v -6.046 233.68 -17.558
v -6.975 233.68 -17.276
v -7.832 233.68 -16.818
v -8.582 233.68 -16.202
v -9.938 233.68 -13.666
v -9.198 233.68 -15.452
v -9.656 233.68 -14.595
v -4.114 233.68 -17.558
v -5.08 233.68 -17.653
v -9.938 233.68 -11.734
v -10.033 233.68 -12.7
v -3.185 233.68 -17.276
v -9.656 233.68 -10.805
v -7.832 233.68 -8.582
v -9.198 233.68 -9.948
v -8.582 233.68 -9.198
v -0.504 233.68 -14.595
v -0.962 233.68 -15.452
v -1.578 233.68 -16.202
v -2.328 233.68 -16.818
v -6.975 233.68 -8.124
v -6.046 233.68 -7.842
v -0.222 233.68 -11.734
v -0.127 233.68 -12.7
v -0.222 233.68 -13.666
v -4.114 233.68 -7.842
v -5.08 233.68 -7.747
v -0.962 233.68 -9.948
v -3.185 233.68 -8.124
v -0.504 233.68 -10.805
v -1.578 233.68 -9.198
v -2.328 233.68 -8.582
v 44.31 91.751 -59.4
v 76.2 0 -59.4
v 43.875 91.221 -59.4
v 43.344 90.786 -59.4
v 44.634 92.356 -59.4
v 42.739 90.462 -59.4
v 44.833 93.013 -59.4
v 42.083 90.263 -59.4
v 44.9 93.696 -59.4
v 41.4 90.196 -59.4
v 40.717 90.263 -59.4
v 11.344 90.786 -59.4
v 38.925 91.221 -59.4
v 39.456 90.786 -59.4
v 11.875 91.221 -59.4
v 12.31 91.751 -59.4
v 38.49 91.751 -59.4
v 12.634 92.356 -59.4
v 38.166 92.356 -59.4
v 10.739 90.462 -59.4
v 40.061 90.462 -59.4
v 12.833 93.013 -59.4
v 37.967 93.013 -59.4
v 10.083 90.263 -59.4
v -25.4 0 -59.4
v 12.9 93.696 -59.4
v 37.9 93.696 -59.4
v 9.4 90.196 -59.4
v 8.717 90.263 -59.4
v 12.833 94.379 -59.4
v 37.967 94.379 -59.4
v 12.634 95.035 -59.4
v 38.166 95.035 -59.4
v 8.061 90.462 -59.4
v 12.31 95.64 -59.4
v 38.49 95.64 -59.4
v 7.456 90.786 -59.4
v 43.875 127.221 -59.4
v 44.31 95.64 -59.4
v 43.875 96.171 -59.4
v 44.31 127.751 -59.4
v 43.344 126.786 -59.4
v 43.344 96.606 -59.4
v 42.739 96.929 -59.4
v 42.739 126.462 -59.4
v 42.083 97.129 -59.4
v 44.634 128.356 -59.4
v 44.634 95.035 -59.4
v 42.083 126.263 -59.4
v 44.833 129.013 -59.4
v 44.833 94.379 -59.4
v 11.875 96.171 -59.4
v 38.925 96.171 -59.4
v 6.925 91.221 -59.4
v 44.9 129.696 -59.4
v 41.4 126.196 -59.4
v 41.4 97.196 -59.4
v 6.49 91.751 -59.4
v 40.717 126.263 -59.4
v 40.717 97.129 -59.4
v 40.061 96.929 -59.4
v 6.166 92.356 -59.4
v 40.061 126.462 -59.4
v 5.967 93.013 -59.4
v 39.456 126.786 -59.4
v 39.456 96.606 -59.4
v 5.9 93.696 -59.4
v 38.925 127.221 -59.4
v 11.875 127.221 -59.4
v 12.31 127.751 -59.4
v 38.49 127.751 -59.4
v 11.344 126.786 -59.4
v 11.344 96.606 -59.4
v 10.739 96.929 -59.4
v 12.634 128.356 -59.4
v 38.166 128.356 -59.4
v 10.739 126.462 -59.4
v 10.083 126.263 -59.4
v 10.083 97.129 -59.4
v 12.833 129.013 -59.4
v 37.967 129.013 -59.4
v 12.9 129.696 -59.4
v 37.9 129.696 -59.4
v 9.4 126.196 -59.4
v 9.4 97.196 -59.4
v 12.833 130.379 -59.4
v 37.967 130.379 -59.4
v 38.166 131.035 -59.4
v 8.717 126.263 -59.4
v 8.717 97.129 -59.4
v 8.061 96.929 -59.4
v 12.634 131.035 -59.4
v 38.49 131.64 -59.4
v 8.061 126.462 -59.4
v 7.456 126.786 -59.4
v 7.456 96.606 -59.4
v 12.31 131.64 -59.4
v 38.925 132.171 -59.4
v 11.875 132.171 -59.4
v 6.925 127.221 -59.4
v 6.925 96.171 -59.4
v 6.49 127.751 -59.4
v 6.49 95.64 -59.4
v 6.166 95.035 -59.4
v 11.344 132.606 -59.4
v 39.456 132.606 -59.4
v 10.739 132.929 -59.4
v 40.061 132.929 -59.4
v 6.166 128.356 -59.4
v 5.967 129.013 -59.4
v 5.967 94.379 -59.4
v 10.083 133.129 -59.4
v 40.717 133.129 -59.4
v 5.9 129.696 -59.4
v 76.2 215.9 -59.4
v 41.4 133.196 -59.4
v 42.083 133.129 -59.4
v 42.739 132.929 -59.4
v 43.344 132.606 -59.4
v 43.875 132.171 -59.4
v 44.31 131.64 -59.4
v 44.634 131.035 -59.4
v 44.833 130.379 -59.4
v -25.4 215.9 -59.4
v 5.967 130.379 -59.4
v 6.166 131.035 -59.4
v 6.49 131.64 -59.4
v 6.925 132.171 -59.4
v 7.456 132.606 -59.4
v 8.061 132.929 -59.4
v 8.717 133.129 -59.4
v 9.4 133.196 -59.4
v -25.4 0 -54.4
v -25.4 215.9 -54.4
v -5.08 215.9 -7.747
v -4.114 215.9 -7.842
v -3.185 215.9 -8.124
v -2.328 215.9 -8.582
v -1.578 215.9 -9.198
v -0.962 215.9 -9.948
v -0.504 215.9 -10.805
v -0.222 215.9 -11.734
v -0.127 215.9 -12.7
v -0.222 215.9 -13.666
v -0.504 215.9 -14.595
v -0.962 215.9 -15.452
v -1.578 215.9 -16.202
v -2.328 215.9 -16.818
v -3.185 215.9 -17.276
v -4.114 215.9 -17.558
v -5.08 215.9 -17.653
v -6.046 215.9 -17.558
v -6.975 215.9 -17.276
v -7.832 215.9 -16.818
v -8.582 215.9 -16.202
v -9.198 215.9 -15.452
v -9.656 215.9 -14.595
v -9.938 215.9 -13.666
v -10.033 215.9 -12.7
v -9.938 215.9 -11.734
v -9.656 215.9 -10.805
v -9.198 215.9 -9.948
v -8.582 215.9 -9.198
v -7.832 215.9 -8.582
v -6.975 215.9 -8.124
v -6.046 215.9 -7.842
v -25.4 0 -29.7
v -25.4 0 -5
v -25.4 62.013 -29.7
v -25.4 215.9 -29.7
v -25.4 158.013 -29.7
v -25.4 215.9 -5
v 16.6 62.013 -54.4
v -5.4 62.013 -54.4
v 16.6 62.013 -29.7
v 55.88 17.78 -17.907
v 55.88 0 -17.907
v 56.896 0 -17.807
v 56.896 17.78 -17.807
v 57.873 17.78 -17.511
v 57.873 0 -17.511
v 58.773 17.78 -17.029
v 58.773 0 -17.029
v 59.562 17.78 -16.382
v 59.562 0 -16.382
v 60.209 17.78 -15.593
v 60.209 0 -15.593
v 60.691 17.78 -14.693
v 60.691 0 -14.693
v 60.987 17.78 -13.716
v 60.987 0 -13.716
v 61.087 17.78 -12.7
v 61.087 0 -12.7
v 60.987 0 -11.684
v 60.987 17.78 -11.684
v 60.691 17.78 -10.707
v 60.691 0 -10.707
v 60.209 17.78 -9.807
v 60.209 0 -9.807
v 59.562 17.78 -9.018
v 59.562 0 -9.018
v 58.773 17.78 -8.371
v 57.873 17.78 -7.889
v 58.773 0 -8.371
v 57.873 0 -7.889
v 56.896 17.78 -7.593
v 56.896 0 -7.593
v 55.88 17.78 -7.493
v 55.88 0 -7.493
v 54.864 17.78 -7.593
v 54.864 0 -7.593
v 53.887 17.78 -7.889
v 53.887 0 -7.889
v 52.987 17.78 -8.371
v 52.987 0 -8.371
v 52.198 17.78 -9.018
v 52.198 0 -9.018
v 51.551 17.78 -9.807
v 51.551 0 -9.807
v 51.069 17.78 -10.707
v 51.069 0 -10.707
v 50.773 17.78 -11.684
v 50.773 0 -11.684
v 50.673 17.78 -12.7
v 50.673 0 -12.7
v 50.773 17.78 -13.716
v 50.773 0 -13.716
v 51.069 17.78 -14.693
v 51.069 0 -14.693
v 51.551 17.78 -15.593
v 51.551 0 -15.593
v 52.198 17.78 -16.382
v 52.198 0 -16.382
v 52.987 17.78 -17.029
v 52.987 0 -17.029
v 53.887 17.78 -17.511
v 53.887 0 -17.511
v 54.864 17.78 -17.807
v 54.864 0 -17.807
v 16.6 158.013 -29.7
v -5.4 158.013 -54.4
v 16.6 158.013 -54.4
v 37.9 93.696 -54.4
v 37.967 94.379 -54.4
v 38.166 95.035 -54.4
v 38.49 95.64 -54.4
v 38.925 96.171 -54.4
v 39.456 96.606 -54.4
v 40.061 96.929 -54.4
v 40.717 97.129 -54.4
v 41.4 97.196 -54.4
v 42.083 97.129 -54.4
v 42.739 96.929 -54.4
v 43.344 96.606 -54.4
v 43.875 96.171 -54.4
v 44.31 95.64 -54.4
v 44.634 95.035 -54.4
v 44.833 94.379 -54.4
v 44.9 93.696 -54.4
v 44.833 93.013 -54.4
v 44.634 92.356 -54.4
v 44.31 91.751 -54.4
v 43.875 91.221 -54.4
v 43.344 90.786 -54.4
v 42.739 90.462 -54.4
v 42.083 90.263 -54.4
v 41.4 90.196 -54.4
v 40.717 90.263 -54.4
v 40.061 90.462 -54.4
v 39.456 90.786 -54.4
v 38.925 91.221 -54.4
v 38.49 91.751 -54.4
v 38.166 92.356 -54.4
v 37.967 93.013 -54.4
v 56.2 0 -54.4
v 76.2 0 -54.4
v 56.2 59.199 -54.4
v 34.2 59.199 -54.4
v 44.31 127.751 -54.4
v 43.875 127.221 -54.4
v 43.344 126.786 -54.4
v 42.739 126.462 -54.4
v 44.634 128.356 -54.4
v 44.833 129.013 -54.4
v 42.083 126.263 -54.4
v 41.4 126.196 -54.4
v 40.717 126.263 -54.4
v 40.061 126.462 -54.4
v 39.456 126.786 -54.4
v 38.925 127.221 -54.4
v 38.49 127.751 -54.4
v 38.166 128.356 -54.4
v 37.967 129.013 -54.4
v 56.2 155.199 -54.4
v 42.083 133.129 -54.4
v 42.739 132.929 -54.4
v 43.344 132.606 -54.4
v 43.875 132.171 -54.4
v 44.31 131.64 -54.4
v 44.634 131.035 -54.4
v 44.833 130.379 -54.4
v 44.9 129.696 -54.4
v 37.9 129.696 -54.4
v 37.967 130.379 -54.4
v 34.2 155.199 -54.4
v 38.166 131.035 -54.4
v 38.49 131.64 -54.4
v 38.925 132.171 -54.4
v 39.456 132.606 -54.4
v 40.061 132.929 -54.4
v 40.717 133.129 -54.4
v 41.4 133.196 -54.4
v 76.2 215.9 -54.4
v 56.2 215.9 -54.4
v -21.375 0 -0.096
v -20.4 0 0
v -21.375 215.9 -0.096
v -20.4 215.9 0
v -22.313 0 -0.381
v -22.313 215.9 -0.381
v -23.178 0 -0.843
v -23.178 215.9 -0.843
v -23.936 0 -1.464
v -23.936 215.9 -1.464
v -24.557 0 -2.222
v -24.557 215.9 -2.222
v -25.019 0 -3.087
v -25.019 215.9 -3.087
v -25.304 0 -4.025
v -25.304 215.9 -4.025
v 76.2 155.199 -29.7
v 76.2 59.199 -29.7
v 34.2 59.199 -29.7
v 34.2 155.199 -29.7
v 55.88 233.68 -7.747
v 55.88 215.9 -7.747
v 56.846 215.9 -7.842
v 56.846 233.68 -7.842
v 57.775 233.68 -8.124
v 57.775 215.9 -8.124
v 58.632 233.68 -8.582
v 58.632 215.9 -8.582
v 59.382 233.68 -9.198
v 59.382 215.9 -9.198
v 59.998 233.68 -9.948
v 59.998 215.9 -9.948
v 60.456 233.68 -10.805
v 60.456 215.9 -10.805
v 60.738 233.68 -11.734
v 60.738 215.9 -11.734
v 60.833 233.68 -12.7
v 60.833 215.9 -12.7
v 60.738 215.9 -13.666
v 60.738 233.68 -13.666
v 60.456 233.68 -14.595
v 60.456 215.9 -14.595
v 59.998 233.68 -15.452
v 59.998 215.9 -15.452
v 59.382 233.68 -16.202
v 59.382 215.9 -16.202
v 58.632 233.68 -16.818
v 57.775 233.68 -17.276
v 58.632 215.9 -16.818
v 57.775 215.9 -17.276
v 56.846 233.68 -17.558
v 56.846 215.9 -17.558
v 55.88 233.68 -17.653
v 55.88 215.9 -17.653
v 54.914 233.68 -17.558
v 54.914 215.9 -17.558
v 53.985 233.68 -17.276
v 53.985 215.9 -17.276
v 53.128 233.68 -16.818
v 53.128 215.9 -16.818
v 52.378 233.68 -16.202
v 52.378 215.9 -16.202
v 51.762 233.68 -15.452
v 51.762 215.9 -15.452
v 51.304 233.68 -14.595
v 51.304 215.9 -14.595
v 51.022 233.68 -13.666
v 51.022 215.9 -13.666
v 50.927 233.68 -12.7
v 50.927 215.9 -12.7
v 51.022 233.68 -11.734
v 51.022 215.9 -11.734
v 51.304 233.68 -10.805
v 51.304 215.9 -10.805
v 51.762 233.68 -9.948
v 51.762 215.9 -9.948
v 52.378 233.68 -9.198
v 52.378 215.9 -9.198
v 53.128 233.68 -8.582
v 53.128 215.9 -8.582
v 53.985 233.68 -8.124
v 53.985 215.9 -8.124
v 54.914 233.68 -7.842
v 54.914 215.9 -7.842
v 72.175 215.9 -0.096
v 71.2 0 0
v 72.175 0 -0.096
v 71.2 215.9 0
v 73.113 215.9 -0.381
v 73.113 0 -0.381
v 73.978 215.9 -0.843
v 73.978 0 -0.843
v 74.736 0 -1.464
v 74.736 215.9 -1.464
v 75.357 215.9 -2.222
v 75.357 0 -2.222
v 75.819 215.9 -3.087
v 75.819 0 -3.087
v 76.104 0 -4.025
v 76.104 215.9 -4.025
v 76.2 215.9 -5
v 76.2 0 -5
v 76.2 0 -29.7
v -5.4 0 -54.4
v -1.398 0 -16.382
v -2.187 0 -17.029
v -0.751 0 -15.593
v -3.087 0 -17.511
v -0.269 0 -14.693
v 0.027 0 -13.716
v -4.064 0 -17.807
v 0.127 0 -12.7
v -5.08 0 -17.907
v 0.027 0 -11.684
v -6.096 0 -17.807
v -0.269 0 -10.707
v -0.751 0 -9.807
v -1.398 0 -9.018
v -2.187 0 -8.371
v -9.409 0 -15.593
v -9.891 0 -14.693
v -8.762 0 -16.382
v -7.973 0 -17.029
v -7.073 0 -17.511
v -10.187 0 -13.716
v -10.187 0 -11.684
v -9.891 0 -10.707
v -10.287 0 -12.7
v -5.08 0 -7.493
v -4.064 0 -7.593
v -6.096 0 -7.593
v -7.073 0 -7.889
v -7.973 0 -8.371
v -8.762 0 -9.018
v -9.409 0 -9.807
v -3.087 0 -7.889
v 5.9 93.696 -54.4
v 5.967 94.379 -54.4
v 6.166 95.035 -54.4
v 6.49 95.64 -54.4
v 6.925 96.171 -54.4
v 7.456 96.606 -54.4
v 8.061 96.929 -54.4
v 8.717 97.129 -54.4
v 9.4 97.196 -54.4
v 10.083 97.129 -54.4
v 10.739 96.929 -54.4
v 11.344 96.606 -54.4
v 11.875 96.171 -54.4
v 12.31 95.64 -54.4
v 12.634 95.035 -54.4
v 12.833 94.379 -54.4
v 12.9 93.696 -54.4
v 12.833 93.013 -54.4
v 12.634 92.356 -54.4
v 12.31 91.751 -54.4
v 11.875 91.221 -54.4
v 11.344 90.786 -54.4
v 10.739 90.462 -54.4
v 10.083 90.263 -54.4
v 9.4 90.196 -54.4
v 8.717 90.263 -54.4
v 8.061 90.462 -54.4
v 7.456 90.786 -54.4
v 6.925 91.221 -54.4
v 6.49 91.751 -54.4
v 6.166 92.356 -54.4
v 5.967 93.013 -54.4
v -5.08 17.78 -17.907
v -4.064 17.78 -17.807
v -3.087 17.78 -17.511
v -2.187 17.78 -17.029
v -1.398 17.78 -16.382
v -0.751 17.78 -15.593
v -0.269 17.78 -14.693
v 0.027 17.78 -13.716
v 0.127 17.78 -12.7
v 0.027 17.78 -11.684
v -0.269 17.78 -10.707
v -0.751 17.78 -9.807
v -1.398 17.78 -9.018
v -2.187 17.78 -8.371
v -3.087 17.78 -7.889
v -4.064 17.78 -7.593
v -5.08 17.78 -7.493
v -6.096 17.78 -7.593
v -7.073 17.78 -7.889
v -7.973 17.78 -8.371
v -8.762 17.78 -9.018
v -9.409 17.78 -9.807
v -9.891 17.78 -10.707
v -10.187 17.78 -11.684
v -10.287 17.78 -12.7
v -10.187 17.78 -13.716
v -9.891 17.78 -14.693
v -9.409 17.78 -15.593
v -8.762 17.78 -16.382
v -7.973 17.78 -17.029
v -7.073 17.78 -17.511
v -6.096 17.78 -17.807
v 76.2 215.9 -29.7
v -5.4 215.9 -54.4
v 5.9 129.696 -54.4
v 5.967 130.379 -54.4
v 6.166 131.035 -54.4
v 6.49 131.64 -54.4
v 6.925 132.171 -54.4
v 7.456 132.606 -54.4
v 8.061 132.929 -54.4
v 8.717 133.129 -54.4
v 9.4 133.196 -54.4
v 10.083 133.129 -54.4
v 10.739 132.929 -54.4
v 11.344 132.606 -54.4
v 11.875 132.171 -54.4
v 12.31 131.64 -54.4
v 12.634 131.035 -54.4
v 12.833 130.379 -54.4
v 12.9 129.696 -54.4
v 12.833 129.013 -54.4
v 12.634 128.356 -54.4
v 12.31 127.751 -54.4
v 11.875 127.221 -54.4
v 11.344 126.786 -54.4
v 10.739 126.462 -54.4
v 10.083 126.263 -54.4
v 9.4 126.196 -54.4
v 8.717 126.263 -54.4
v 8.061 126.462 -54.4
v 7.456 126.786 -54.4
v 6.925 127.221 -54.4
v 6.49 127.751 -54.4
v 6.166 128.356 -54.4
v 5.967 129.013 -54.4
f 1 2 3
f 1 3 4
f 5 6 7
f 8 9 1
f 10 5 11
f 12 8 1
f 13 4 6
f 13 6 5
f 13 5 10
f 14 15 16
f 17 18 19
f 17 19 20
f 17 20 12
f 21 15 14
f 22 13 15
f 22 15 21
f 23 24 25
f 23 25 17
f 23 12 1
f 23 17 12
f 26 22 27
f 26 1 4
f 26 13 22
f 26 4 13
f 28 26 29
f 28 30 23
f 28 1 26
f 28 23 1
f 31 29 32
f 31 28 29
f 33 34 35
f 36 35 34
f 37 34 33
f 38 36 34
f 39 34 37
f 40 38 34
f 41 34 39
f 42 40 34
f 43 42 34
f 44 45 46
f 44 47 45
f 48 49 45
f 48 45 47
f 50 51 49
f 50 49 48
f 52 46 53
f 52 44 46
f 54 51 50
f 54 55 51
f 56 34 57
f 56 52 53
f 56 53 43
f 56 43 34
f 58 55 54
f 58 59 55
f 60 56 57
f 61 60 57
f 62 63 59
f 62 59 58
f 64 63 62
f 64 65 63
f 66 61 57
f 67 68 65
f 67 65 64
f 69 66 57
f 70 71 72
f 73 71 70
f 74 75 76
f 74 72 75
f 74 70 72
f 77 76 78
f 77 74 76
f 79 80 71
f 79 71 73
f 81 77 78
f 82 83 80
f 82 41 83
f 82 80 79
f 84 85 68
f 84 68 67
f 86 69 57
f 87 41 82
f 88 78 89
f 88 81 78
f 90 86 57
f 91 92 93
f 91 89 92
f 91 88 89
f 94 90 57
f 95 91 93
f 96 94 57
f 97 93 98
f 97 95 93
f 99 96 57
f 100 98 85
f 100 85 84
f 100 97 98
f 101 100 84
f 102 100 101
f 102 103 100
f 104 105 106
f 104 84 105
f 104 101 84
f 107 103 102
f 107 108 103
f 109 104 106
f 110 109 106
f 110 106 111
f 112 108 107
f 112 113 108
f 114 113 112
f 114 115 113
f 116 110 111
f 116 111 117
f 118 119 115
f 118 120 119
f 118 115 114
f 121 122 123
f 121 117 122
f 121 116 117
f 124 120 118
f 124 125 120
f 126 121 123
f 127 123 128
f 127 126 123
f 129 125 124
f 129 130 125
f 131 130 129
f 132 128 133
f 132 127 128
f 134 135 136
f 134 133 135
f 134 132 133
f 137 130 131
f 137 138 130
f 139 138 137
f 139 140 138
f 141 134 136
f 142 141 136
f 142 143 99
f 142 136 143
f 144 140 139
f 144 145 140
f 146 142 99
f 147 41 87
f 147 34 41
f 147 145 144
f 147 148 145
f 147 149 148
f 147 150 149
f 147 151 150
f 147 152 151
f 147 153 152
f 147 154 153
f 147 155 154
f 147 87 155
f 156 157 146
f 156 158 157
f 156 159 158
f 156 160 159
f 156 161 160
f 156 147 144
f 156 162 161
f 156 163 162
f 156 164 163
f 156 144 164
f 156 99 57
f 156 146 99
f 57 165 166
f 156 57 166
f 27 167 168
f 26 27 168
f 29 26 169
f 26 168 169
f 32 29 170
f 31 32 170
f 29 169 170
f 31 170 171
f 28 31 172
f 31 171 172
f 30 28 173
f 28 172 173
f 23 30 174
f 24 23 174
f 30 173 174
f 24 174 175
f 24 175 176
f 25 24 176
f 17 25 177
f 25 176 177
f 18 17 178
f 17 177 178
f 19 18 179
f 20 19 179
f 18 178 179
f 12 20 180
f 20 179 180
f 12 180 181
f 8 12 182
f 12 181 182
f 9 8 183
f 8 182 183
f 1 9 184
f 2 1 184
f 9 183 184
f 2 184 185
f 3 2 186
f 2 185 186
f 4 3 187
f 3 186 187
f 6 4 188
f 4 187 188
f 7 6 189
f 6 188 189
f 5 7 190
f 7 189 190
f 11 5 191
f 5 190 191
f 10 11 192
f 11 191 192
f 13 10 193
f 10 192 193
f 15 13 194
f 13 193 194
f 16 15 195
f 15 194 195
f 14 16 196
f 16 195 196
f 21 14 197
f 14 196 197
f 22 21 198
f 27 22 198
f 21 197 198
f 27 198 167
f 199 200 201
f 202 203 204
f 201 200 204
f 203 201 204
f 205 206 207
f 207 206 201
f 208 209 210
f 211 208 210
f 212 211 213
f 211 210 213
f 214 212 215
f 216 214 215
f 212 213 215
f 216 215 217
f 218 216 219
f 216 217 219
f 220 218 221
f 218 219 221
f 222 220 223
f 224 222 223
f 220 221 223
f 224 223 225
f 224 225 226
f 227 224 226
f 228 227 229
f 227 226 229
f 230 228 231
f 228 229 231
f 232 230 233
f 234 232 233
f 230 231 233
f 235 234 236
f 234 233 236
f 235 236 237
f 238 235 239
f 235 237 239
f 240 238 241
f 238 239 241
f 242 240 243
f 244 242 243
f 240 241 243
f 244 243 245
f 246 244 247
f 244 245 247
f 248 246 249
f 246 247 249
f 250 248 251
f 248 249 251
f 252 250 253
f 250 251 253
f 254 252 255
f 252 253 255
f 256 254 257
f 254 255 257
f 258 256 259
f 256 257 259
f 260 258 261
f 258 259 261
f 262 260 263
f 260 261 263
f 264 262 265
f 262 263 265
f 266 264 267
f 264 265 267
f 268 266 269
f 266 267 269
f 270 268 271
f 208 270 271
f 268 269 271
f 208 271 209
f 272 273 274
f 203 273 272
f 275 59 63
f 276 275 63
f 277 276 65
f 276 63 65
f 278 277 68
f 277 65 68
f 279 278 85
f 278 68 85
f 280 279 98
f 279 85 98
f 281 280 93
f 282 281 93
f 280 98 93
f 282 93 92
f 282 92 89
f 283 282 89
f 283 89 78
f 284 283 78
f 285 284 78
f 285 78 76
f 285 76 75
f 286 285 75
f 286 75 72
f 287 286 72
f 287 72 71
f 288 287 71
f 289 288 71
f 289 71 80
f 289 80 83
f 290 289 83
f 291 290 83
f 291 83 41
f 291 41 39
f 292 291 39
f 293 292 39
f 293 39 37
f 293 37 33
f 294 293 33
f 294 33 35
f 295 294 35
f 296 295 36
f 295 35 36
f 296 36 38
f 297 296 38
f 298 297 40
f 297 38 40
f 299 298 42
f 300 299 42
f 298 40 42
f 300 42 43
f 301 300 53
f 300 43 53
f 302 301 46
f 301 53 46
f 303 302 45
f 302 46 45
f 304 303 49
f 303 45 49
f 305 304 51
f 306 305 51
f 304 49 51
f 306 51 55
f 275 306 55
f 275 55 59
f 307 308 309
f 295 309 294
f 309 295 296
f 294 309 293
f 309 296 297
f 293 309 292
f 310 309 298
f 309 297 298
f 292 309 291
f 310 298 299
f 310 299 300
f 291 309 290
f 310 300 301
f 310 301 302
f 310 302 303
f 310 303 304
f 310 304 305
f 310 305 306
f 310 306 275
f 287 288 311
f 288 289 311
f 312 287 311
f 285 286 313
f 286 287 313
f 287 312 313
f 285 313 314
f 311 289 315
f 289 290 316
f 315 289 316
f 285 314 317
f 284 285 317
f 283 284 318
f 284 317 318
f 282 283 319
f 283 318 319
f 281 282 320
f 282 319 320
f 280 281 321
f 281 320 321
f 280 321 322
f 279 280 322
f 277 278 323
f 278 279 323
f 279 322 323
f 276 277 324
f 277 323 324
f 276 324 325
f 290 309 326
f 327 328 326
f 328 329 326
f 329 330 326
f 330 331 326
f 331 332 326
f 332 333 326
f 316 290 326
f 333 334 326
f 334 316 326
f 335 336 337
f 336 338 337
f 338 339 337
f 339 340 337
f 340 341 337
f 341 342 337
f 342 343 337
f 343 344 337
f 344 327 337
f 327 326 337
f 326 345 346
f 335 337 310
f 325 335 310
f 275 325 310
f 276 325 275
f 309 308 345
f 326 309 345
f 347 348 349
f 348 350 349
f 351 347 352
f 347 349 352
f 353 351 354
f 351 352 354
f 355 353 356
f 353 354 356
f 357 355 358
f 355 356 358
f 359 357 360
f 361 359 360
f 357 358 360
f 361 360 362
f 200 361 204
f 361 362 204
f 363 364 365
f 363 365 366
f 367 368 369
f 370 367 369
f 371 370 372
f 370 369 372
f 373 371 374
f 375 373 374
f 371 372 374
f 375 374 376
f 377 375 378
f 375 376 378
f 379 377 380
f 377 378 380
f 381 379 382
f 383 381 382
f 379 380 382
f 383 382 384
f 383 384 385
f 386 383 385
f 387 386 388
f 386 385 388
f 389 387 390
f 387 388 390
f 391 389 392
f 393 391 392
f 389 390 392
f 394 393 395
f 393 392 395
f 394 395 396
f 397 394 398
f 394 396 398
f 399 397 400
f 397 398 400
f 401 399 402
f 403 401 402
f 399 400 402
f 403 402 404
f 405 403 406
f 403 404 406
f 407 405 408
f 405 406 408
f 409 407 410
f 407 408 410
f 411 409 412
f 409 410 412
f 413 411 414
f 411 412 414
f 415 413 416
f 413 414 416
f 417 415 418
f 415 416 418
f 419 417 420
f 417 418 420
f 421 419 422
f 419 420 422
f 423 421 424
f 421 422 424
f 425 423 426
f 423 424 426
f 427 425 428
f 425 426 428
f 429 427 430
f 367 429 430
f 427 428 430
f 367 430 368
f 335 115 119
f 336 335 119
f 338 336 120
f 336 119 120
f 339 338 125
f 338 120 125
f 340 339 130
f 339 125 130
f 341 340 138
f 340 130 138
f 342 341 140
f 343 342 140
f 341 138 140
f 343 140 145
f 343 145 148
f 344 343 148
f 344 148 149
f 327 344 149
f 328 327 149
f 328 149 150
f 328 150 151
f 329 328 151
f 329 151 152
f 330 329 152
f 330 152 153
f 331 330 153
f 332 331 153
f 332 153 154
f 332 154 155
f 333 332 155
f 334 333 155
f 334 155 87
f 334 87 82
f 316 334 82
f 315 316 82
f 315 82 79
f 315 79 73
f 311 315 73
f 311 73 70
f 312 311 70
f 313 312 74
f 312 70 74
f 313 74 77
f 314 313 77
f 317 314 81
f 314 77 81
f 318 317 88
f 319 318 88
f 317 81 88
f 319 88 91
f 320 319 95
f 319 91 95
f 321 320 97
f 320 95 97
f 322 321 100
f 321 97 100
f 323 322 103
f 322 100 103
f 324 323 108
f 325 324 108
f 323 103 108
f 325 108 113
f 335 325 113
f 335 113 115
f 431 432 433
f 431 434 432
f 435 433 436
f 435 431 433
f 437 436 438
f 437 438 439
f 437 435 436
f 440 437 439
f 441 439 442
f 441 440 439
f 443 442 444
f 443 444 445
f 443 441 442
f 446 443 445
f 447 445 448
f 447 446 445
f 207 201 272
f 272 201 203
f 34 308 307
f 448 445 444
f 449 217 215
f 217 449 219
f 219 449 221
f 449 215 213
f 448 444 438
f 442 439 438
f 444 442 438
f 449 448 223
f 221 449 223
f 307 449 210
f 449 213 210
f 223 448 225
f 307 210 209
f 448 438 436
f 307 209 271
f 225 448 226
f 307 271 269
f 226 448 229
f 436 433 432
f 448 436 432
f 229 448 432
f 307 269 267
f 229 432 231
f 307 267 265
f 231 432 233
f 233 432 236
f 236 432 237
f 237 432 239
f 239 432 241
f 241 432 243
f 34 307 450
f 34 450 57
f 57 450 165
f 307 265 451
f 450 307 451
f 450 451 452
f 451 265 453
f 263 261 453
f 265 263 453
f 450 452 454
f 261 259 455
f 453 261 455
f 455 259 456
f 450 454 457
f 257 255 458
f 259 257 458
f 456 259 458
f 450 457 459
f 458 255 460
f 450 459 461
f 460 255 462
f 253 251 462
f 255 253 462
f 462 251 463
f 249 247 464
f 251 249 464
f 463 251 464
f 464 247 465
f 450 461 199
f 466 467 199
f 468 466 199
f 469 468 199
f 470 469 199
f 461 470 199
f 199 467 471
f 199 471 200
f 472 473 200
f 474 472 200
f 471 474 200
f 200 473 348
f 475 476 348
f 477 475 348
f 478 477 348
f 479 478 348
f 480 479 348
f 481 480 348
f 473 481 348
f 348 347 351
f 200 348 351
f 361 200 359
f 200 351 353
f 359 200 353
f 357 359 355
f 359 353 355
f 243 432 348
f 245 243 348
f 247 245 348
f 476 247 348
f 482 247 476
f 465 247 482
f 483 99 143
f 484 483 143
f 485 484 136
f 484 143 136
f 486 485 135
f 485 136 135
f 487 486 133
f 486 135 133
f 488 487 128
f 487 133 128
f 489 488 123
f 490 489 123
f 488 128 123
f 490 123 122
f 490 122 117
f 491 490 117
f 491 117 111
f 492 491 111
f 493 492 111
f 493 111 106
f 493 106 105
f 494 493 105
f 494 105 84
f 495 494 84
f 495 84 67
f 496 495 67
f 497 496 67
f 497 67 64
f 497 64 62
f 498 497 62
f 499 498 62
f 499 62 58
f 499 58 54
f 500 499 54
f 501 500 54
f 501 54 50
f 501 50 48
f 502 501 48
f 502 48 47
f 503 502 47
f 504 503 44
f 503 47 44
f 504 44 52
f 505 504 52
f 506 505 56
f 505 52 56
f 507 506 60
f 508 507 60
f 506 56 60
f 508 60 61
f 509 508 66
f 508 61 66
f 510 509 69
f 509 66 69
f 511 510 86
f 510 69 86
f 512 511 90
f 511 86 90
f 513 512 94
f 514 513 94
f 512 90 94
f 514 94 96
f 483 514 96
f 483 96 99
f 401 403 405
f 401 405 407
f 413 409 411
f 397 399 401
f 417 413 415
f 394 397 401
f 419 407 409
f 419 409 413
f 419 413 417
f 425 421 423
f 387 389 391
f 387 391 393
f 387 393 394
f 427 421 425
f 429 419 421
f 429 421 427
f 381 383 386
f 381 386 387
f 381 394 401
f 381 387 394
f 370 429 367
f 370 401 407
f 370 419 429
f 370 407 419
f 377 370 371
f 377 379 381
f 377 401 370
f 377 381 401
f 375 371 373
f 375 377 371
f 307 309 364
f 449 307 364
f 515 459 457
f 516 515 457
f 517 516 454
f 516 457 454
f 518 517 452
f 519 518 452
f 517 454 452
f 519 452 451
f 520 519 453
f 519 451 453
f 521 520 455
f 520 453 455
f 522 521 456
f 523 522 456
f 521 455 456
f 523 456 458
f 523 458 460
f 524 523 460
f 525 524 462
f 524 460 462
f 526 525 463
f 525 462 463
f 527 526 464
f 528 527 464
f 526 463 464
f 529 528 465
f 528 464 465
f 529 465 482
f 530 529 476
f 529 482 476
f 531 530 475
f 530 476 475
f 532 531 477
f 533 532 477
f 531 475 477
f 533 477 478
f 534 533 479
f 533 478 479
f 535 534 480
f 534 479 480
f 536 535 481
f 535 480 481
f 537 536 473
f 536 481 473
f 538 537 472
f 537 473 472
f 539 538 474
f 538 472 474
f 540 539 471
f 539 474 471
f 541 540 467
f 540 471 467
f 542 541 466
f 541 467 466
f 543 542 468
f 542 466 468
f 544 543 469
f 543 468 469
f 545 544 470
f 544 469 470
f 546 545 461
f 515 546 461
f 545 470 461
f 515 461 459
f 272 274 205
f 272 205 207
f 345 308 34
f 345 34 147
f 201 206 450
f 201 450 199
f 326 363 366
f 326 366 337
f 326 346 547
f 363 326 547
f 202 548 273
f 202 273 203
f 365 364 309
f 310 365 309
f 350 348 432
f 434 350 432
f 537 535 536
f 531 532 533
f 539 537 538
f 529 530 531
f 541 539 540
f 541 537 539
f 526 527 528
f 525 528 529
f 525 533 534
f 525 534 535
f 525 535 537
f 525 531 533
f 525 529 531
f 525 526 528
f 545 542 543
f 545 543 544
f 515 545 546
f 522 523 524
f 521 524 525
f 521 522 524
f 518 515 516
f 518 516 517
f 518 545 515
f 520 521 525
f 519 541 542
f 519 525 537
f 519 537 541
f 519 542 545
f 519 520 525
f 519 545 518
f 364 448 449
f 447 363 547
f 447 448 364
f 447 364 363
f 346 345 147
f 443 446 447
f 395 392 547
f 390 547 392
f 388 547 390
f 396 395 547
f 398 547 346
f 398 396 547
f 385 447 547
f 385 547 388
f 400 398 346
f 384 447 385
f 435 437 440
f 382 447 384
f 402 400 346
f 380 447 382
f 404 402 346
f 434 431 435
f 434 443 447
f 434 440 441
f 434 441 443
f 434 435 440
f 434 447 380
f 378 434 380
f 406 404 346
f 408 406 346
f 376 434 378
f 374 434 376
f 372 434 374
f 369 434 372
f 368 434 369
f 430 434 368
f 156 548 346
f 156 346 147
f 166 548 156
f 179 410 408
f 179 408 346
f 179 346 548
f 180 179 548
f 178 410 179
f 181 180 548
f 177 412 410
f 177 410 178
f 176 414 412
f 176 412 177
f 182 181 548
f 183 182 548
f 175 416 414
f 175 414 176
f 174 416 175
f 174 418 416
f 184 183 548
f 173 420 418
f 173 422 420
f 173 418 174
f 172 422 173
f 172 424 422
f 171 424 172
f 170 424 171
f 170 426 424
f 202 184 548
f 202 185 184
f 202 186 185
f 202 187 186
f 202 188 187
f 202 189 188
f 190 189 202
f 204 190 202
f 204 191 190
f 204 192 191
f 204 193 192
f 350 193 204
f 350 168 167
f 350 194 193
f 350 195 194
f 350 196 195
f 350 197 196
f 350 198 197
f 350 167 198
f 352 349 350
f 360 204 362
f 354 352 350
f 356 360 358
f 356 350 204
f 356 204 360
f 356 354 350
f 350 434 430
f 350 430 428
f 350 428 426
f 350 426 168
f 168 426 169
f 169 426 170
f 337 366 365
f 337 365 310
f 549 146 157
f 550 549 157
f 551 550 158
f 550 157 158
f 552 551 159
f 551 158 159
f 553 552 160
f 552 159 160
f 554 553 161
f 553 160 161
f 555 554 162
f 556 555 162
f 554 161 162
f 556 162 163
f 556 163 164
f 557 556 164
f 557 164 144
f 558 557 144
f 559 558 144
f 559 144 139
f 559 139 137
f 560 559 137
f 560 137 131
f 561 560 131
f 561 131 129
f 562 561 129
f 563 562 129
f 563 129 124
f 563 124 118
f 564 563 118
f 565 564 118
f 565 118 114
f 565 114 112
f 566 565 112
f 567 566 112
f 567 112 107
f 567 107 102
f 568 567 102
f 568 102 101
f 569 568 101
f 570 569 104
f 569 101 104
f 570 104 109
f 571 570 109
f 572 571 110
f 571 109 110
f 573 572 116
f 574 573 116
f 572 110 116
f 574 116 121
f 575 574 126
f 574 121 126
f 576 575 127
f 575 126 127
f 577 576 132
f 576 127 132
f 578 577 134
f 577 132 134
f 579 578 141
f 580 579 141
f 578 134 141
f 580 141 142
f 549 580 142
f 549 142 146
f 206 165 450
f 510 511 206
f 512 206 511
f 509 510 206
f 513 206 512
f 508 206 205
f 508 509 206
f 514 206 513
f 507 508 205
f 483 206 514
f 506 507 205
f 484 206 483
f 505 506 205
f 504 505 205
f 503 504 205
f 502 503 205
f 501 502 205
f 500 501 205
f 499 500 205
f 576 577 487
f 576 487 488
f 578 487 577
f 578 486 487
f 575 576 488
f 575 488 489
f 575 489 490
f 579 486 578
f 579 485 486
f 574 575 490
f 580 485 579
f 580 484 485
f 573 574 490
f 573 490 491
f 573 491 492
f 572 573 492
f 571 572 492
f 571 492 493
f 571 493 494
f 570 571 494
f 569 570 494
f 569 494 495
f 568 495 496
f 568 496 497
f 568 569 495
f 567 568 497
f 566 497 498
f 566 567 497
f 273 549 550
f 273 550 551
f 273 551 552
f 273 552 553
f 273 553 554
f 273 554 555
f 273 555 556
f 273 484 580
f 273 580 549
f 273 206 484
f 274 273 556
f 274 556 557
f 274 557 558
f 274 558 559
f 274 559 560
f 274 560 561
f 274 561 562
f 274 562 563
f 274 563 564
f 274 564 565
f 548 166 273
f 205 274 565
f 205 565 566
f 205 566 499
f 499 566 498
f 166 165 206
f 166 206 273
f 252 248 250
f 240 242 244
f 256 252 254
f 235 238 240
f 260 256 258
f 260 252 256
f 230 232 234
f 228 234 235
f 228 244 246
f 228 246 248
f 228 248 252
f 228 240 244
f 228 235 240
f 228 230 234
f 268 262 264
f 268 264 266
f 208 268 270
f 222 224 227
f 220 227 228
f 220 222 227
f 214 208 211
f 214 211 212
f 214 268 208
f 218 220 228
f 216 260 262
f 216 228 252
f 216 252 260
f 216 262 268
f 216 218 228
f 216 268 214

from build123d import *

# Parameters (mm, degrees)
SKETCH1_W           = 101.6
SKETCH1_H           = 25.4
BOSS_EXTRUDE1_DEPTH = 215.9
SKETCH3_R           = 5.207
CUT_EXTRUDE1_DEPTH  = 17.78
SKETCH4_R           = 4.953
BOSS_EXTRUDE3_DEPTH = 17.78
SKETCH8_W           = 101.6
SKETCH8_H           = 215.9
BOSS_EXTRUDE4_DEPTH = 34
CUT_EXTRUDE2_DEPTH  = 217
SKETCH14_R          = 3.5
CUT_EXTRUDE3_DEPTH  = 9
FILLET1_R           = 5
FILLET2_R           = 5
SKETCH16_W          = 24.7
SKETCH16_H          = 96
CUT_EXTRUDE4_DEPTH  = 42
SKETCH17_W          = 24.7
SKETCH17_H          = 96
CUT_EXTRUDE5_DEPTH  = 42


with BuildPart() as part:
    # Sketch1 → Boss-Extrude1 (new body)
    with BuildSketch(Plane(origin=(0, 0, 0), x_dir=(1, 0, 0), z_dir=(0, 1, 0))):
        with Locations((25.4, 12.7)):
            Rectangle(SKETCH1_W, SKETCH1_H)
    extrude(amount=BOSS_EXTRUDE1_DEPTH)

    # Sketch3 → Cut-Extrude1 (cut)
    with BuildSketch(Plane(origin=(0, 0, 0), x_dir=(-1, 0, 0), z_dir=(0, -1, 0))):
        with Locations(Location((5.08, 12.7, 0), (0, 0, 90))):
            Circle(SKETCH3_R)
        with Locations(Location((-55.88, 12.7, 0), (0, 0, 90))):
            Circle(SKETCH3_R)
    extrude(amount=-CUT_EXTRUDE1_DEPTH, mode=Mode.SUBTRACT)

    # Sketch4 → Boss-Extrude3 (add)
    with BuildSketch(Plane(origin=(0, 215.9, 0), x_dir=(1, 0, 0), z_dir=(0, 1, 0))):
        with Locations(Location((-5.08, 12.7, 0), (0, 0, 270))):
            Circle(SKETCH4_R)
        with Locations(Location((55.88, 12.7, 0), (0, 0, 270))):
            Circle(SKETCH4_R)
    extrude(amount=BOSS_EXTRUDE3_DEPTH)

    # Sketch8 → Boss-Extrude4 (add)
    with BuildSketch(Plane(origin=(0, 0, -25.4), x_dir=(-1, 0, 0), z_dir=(0, 0, -1))):
        with Locations((-25.4, 107.95)):
            Rectangle(SKETCH8_W, SKETCH8_H)
    extrude(amount=BOSS_EXTRUDE4_DEPTH)

    # Sketch10 → Cut-Extrude2 (cut)
    with BuildSketch(Plane(origin=(0, 215.9, 0), x_dir=(1, 0, 0), z_dir=(0, 1, 0))):
        Polygon((-25.4, 54.4), (-5.4, 54.4), (-25.4, 29.7), align=None)
        Polygon((76.2, 54.4), (56.2, 54.4), (76.2, 29.7), align=None)
    extrude(amount=-CUT_EXTRUDE2_DEPTH, mode=Mode.SUBTRACT)

    # Sketch14 → Cut-Extrude3 (cut)
    with BuildSketch(Plane(origin=(0, 0, -59.4), x_dir=(-1, 0, 0), z_dir=(0, 0, -1))):
        with Locations((-41.400000283, 129.695762338)):
            Circle(SKETCH14_R)
        with Locations((-9.400000283, 129.695762338)):
            Circle(SKETCH14_R)
        with Locations((-41.400000283, 93.695762338)):
            Circle(SKETCH14_R)
        with Locations((-9.400000283, 93.695762338)):
            Circle(SKETCH14_R)
    extrude(amount=-CUT_EXTRUDE3_DEPTH, mode=Mode.SUBTRACT)

    # Fillet1
    fillet1_edges = [part.edges().sort_by_distance(p)[0] for p in [
        (-25.4, 107.95, 0),
    ]]
    fillet(fillet1_edges, radius=FILLET1_R)

    # Fillet2
    fillet2_edges = [part.edges().sort_by_distance(p)[0] for p in [
        (76.2, 107.95, 0),
    ]]
    fillet(fillet2_edges, radius=FILLET2_R)

    # Sketch16 → Cut-Extrude4 (cut)
    with BuildSketch(Plane.ZY.offset(25.4)):
        with Locations((-42.05, 110.012919034)):
            Rectangle(SKETCH16_W, SKETCH16_H)
    extrude(amount=-CUT_EXTRUDE4_DEPTH, mode=Mode.SUBTRACT)

    # Sketch17 → Cut-Extrude5 (cut)
    with BuildSketch(Plane(origin=(76.2, 0, 0), x_dir=(0, 0, -1), z_dir=(1, 0, 0))):
        with Locations((42.05, 107.199291506)):
            Rectangle(SKETCH17_W, SKETCH17_H)
    extrude(amount=-CUT_EXTRUDE5_DEPTH, mode=Mode.SUBTRACT)


solid = part.part
